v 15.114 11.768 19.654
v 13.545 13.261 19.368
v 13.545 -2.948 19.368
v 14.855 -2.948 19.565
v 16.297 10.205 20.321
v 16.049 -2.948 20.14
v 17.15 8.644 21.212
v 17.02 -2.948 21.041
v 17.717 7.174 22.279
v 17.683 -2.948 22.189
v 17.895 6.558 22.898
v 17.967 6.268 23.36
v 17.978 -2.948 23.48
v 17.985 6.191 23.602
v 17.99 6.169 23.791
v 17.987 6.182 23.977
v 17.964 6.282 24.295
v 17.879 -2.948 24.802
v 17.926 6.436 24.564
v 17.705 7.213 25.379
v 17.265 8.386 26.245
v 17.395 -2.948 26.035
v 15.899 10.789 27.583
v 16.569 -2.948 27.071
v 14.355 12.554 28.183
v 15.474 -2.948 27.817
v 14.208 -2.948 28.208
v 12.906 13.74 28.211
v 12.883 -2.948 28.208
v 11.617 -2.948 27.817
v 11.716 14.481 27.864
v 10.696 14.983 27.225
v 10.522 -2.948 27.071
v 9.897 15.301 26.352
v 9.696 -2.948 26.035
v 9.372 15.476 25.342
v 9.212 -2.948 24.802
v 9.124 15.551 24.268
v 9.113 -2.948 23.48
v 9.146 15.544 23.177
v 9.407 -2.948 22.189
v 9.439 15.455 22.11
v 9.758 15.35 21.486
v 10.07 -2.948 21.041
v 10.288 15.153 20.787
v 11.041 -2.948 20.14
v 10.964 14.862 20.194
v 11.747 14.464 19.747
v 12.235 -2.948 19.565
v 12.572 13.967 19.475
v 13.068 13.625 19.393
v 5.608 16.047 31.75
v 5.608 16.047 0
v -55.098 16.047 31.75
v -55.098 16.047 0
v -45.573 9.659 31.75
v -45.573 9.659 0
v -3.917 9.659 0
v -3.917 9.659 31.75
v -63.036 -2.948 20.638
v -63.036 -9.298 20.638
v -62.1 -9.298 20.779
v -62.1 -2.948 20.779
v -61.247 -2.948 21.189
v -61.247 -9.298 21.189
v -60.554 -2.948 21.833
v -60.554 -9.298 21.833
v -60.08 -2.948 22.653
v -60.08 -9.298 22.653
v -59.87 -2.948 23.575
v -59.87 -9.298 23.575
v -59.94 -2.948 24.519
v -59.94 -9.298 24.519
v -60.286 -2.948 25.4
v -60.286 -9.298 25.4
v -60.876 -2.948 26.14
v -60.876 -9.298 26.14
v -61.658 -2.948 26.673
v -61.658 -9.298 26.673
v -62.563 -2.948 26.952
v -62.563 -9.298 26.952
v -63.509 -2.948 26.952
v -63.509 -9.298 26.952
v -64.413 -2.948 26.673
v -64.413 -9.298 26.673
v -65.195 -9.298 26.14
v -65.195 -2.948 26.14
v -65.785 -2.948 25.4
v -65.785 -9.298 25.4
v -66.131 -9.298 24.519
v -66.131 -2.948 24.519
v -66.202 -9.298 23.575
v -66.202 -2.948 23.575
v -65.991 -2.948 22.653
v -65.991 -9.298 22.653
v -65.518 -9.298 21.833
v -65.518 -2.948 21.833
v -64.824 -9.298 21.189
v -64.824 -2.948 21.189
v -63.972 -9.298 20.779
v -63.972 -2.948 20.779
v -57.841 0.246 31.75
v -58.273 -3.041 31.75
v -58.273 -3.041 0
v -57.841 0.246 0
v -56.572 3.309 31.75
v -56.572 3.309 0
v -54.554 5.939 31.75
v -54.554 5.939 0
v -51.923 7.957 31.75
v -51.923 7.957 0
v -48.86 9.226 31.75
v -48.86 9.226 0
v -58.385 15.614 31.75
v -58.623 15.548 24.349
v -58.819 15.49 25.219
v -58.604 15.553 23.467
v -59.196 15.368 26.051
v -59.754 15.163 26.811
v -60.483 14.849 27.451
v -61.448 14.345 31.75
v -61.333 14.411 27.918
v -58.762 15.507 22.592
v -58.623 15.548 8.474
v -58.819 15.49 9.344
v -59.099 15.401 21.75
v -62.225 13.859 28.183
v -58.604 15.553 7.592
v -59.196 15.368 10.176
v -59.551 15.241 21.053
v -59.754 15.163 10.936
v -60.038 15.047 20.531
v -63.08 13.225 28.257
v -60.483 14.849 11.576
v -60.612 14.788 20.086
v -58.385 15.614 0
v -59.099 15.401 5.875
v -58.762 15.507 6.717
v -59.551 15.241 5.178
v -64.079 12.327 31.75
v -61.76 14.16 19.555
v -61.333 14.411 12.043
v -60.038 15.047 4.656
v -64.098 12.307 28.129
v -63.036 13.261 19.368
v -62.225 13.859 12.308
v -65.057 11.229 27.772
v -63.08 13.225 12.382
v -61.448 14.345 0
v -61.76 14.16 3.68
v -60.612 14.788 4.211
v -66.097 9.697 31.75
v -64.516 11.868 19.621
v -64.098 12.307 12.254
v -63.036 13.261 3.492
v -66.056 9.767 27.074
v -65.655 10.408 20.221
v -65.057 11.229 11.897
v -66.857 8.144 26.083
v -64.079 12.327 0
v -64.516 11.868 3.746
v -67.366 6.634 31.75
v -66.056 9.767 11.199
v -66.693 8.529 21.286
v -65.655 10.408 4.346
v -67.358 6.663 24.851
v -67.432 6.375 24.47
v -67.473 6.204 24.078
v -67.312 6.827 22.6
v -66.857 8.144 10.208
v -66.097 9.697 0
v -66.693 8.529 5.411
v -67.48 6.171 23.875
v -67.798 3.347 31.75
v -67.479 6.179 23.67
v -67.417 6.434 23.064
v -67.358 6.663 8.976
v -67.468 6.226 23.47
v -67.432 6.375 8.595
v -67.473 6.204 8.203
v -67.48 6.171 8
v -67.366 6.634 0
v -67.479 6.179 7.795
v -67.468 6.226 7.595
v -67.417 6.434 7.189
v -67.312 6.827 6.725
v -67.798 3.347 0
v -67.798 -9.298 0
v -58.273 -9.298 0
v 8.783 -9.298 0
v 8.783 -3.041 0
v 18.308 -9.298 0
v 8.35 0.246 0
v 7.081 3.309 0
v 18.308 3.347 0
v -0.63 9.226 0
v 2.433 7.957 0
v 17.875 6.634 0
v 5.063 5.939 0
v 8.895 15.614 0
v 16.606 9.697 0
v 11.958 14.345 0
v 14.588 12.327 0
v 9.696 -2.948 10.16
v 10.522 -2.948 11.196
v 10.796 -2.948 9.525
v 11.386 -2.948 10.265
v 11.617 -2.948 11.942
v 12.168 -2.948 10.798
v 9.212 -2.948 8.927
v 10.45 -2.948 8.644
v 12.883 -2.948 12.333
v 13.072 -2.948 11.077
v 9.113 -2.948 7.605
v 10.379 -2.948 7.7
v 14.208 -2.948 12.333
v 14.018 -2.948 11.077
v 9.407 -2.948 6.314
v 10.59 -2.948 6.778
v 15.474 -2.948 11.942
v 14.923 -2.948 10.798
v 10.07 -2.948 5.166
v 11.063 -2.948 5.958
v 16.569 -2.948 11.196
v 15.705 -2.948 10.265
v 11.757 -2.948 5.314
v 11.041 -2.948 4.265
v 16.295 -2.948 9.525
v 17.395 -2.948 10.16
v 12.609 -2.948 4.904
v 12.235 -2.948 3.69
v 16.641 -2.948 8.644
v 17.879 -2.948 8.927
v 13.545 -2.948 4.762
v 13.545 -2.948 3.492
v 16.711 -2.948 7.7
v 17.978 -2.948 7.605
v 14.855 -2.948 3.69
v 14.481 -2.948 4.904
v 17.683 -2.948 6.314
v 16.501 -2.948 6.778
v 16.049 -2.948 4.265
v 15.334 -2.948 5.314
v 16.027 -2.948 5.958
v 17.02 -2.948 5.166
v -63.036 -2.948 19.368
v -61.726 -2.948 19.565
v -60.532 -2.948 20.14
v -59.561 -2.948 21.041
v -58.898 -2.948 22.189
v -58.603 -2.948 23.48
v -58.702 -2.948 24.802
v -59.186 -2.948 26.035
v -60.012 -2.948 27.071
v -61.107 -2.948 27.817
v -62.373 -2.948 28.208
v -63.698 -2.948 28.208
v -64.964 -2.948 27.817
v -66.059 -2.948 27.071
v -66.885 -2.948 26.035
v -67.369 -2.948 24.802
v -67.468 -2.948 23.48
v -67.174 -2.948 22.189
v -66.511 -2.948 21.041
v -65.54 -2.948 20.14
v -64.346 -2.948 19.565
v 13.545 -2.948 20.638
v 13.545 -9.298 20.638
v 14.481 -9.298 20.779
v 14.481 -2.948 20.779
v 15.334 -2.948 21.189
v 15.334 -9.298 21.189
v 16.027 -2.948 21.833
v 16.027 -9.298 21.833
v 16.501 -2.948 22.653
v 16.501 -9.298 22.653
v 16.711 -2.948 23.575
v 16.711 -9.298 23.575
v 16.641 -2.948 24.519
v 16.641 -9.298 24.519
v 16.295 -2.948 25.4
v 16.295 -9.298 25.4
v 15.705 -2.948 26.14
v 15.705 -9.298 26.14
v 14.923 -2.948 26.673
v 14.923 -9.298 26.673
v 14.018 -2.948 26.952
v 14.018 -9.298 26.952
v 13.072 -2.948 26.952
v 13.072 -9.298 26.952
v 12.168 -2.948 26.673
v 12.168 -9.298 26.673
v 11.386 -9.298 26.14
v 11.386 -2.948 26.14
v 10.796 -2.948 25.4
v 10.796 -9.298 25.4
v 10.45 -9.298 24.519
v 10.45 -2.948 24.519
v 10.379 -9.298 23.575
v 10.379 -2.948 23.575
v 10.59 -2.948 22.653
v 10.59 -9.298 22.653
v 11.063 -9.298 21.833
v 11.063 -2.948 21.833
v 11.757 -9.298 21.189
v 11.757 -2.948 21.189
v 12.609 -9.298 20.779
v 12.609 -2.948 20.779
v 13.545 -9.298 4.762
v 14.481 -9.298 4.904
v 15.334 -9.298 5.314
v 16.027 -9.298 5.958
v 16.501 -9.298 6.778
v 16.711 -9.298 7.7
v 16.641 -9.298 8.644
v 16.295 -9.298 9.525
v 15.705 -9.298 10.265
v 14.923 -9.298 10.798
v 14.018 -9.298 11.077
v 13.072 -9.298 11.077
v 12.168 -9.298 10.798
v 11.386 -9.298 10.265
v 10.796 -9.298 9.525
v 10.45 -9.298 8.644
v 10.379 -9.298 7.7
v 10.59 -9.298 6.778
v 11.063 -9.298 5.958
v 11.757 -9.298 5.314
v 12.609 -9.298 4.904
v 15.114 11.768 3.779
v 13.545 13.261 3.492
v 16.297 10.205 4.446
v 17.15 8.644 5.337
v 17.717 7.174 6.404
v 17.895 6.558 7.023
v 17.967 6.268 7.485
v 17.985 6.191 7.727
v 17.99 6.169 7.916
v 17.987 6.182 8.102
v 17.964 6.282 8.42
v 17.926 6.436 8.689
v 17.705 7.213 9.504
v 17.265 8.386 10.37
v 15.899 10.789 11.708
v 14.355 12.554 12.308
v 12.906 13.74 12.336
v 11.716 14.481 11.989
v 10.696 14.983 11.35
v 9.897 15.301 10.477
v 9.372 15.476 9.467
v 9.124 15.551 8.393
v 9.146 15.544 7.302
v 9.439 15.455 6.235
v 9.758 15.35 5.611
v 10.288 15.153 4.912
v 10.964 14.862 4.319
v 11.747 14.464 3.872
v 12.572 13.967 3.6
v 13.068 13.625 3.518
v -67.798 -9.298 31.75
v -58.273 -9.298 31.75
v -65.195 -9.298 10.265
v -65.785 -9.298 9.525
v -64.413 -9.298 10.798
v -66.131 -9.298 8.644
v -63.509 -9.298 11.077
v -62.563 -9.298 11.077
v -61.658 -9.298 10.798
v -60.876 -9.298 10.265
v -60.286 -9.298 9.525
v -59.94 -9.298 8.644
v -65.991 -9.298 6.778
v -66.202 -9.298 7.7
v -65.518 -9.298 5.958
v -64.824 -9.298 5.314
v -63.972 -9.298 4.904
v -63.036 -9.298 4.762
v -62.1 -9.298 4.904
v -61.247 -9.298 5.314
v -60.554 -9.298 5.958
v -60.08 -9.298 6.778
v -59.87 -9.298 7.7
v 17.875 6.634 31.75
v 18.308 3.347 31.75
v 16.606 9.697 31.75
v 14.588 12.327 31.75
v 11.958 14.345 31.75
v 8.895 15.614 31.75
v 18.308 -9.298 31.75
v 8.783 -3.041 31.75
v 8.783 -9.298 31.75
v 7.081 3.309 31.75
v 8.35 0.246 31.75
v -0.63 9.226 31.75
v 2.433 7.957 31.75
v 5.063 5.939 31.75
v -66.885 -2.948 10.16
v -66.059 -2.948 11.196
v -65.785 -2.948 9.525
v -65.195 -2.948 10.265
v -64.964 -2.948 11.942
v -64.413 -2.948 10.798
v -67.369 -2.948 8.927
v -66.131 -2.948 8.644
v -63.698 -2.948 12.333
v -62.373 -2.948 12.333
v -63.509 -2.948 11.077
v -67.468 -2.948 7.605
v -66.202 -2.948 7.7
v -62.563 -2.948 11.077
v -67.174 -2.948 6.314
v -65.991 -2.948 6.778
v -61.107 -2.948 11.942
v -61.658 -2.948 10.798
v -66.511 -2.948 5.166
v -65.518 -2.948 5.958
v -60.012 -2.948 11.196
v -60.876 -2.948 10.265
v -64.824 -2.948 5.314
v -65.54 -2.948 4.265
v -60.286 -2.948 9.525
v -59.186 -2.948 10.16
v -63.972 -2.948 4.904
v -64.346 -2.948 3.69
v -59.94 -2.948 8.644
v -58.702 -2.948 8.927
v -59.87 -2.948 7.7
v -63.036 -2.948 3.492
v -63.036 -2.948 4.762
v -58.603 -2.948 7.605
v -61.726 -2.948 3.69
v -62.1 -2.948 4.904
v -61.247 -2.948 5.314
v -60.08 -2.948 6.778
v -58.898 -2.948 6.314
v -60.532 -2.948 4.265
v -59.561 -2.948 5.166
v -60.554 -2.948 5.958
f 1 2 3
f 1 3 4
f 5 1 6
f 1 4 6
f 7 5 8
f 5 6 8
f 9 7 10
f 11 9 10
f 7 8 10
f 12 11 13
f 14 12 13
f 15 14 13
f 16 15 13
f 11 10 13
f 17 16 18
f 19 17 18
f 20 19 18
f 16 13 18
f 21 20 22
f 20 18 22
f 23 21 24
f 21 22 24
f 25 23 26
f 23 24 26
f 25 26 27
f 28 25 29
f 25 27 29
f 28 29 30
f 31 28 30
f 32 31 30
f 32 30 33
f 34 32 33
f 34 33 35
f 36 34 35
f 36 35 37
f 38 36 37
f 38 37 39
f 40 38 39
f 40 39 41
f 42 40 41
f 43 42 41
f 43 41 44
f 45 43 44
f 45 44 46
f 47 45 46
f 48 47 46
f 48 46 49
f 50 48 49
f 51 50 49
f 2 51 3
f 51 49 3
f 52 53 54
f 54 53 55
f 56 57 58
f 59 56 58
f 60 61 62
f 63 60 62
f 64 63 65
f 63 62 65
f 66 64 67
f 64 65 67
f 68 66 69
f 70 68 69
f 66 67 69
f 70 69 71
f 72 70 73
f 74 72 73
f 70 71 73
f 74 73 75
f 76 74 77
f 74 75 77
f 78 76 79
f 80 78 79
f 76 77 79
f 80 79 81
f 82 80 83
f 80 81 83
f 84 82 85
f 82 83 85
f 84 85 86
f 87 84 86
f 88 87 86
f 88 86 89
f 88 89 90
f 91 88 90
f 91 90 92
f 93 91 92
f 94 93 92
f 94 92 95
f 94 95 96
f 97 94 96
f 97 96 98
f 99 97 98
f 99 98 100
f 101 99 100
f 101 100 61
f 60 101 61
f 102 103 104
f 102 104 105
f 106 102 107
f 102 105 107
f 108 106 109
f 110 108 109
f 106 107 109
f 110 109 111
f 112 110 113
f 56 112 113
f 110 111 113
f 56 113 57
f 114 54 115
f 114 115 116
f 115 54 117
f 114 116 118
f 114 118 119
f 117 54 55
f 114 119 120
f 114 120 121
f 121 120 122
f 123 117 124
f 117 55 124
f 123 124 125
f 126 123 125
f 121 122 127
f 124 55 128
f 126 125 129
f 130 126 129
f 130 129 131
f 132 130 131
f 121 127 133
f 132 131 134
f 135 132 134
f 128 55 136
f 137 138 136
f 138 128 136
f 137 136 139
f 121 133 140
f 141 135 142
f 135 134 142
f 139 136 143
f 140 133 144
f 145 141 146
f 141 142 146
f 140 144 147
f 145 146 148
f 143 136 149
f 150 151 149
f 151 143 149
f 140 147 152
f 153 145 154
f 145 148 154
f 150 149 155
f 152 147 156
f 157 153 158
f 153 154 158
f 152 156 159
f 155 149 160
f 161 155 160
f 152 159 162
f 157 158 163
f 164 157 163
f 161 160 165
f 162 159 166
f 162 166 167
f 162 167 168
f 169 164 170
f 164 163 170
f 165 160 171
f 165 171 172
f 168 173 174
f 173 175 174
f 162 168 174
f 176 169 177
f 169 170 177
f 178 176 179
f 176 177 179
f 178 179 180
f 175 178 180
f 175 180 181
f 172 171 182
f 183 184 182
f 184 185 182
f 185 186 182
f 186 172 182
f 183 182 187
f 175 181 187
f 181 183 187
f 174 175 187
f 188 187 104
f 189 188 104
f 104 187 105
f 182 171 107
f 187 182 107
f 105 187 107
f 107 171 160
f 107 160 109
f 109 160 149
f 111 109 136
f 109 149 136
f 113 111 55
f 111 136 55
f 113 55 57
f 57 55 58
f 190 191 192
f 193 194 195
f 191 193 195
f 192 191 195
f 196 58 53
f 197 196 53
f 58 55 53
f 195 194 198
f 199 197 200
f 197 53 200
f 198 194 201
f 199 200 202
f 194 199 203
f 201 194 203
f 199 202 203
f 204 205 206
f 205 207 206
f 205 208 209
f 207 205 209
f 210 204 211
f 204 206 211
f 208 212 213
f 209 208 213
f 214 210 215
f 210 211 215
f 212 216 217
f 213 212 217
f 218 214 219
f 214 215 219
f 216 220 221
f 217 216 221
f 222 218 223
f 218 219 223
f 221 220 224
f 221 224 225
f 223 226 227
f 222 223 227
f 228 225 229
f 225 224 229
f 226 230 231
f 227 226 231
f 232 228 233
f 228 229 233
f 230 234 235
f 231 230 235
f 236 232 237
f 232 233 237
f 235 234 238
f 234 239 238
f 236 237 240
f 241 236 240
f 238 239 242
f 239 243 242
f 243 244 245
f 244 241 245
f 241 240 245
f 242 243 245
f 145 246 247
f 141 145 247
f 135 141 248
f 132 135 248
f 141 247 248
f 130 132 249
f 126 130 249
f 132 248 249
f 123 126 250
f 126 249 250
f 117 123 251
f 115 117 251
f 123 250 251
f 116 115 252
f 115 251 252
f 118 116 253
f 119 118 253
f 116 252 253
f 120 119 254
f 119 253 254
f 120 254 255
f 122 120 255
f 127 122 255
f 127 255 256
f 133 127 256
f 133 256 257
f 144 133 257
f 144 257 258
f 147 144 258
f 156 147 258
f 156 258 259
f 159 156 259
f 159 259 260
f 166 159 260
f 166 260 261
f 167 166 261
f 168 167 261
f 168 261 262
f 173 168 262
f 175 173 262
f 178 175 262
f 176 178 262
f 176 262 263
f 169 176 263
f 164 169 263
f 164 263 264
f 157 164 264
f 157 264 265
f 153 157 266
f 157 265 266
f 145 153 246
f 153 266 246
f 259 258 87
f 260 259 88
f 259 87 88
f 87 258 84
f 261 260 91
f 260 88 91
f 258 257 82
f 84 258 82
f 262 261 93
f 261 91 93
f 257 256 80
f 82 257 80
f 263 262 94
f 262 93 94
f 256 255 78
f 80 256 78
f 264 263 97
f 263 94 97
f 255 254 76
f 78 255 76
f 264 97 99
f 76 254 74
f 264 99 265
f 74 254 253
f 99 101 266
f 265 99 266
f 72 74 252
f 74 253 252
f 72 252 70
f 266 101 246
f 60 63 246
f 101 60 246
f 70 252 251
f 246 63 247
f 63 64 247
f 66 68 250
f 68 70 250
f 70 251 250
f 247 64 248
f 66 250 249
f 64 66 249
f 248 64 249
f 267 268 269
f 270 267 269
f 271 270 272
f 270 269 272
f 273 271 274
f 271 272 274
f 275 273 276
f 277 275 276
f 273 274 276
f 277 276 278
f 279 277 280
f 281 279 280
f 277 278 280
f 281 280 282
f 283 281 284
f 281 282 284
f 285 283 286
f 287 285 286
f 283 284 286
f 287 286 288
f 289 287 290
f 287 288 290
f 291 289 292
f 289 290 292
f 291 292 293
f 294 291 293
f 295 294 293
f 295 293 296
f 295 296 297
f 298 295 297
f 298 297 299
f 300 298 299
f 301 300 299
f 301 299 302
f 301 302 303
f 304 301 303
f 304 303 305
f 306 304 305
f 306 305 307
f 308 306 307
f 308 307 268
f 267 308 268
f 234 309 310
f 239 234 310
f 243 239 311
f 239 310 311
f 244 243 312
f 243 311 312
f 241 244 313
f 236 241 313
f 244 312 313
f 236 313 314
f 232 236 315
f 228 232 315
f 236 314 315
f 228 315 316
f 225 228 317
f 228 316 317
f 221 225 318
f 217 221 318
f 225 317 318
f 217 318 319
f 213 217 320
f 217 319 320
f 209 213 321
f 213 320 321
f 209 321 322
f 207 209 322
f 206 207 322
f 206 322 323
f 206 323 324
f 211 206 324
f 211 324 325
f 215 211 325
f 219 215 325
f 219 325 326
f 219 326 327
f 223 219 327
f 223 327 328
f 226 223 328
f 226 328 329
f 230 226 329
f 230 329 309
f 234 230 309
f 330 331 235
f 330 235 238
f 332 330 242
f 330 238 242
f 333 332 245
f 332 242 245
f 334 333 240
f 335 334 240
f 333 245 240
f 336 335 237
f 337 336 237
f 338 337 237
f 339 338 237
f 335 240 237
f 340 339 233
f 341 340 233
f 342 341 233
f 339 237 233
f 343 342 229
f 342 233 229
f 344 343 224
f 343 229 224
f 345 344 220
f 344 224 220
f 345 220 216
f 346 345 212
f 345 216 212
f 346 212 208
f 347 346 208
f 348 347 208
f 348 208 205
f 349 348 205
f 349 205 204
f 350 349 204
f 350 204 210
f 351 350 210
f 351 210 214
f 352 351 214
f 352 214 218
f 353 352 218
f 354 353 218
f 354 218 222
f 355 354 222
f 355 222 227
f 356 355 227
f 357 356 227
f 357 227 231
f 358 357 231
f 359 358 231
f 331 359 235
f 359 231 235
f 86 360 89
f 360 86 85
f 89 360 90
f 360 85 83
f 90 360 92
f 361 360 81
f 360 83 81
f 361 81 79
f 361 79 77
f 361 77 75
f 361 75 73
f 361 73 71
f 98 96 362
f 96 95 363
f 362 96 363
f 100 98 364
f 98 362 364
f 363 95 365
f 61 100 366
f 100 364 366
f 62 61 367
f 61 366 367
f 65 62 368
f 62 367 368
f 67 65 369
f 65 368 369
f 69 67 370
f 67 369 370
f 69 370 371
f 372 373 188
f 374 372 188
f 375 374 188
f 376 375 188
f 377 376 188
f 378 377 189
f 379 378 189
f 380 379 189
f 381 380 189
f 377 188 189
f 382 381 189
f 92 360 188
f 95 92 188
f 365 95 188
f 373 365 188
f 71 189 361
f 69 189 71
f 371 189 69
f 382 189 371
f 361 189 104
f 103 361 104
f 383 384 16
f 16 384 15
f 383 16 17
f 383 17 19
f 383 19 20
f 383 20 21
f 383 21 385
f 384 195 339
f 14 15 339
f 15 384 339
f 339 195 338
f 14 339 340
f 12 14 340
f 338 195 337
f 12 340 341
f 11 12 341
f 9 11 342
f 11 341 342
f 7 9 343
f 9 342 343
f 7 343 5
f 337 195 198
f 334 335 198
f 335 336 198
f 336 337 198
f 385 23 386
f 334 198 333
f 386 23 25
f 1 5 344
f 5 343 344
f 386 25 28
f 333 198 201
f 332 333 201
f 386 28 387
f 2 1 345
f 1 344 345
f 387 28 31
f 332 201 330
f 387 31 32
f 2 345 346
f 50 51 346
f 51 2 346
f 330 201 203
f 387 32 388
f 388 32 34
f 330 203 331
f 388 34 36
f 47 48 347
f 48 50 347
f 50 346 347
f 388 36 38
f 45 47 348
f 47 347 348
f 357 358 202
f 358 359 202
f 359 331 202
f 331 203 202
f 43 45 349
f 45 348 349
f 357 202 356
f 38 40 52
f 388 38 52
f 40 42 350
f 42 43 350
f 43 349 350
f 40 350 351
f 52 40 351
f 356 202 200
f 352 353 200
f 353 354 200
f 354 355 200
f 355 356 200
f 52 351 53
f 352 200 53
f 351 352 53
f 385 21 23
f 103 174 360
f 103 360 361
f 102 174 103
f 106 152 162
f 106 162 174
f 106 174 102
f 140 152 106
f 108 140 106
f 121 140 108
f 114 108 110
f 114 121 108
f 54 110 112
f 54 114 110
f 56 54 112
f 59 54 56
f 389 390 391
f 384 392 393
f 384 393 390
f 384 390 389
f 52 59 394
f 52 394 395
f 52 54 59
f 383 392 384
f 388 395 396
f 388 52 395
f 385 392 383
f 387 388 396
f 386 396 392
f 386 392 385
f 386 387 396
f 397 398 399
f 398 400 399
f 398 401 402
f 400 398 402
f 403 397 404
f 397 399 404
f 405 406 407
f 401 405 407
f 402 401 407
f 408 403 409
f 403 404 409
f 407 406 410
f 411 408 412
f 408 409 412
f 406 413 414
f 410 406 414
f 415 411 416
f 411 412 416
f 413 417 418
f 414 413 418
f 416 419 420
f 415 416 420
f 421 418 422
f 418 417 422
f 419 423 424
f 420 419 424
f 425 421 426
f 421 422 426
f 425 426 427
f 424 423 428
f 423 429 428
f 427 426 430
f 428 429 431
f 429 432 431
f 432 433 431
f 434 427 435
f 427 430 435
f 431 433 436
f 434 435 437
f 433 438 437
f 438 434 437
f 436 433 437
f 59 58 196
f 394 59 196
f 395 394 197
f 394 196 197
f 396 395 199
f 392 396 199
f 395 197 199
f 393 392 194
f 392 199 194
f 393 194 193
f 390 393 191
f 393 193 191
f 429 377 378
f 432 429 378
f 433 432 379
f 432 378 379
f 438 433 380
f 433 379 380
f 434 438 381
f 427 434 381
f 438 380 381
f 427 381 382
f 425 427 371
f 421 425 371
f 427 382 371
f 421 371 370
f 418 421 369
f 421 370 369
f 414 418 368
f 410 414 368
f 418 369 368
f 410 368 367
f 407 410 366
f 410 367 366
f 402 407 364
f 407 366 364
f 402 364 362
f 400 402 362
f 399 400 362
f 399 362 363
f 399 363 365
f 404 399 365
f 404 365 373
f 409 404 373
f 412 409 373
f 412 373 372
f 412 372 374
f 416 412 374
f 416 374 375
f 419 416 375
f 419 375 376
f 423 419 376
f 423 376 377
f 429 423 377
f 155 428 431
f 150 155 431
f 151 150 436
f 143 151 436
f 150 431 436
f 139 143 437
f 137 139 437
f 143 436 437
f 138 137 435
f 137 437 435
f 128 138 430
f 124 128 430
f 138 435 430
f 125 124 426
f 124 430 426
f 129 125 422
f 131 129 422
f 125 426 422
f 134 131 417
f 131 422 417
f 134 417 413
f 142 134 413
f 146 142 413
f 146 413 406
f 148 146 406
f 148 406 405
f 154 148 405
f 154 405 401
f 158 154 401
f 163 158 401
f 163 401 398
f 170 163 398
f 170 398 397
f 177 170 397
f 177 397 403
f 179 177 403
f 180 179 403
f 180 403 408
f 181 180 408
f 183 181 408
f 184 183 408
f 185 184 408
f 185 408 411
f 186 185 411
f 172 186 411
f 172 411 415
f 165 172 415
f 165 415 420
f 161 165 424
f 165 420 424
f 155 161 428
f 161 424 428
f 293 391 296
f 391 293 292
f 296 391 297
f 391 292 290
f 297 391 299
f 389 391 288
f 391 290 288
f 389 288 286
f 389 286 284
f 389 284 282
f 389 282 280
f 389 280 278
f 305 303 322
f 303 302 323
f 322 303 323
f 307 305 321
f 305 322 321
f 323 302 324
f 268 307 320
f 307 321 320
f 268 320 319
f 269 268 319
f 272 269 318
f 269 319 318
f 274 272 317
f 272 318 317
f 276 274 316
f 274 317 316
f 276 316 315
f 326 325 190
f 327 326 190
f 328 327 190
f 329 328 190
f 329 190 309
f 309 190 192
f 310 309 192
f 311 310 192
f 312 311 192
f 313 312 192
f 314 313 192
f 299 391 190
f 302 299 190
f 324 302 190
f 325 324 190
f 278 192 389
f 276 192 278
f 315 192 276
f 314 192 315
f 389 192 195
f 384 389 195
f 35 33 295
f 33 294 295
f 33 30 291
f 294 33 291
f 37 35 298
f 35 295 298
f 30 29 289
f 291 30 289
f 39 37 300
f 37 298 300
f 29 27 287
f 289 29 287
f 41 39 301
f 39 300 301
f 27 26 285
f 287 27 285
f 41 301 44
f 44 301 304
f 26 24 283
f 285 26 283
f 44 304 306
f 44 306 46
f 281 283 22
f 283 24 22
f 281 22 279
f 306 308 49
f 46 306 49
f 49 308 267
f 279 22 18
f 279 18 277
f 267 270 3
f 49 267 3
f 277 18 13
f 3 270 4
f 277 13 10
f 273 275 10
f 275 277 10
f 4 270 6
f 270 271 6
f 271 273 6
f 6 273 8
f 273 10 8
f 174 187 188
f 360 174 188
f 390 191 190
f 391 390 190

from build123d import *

# Parameters (mm, degrees)
BOSS_EXTRUDE1_DEPTH = 31.75
SKETCH2_R           = 3.175
CUT_EXTRUDE1_DEPTH  = 37.084
SKETCH3_R           = 4.445
CUT_EXTRUDE2_DEPTH  = 37.084


with BuildPart() as part:
    # Sketch1 → Boss-Extrude1 (new body)
    with BuildSketch(Plane.XY):
        with BuildLine():
            Line((-58.273322186, -9.297932879), (-58.273322186, -3.041379021))
            ThreePointArc((-58.273322186, -3.041379021), (-54.553578308, 5.9388771), (-45.573322186, 9.658620979))
            Line((-45.573322186, 9.658620979), (-3.917322186, 9.658620979))
            ThreePointArc((-3.917322186, 9.658620979), (5.062933935, 5.9388771), (8.782677814, -3.041379021))
            Line((8.782677814, -3.041379021), (8.782677814, -9.297932879))
            Line((8.782677814, -9.297932879), (18.307677814, -9.297932879))
            Line((18.307677814, -9.297932879), (18.307677814, 3.346975696))
            ThreePointArc((18.307677814, 3.346975696), (14.587933935, 12.327231817), (5.607677814, 16.046975696))
            Line((5.607677814, 16.046975696), (-55.098322186, 16.046975696))
            ThreePointArc((-55.098322186, 16.046975696), (-64.078578308, 12.327231817), (-67.798322186, 3.346975696))
            Line((-67.798322186, 3.346975696), (-67.798322186, -9.297932879))
            Line((-67.798322186, -9.297932879), (-58.273322186, -9.297932879))
        make_face()
    extrude(amount=BOSS_EXTRUDE1_DEPTH)

    # Sketch2 → Cut-Extrude1 (cut)
    with BuildSketch(Plane.XZ.offset(9.297932879)):
        with Locations(Location((-63.035822186, 7.9375, 0), (0, 0, 270))):
            Circle(SKETCH2_R)
        with Locations(Location((-63.035822186, 23.8125, 0), (0, 0, 270))):
            Circle(SKETCH2_R)
        with Locations(Location((13.545177814, 23.8125, 0), (0, 0, 270))):
            Circle(SKETCH2_R)
        with Locations(Location((13.545177814, 7.9375, 0), (0, 0, 270))):
            Circle(SKETCH2_R)
    extrude(amount=-CUT_EXTRUDE1_DEPTH, mode=Mode.SUBTRACT)

    # Sketch3 → Cut-Extrude2 (cut)
    with BuildSketch(Plane(origin=(0, -2.947932879, 0), x_dir=(-1, 0, 0), z_dir=(0, -1, 0))):
        with Locations(Location((-13.545177814, -23.8125, 0), (0, 0, 90))):
            Circle(SKETCH3_R)
        with Locations(Location((-13.545177814, -7.9375, 0), (0, 0, 90))):
            Circle(SKETCH3_R)
        with Locations(Location((63.035822186, -23.8125, 0), (0, 0, 90))):
            Circle(SKETCH3_R)
        with Locations(Location((63.035822186, -7.9375, 0), (0, 0, 90))):
            Circle(SKETCH3_R)
    extrude(amount=-CUT_EXTRUDE2_DEPTH, mode=Mode.SUBTRACT)


solid = part.part
